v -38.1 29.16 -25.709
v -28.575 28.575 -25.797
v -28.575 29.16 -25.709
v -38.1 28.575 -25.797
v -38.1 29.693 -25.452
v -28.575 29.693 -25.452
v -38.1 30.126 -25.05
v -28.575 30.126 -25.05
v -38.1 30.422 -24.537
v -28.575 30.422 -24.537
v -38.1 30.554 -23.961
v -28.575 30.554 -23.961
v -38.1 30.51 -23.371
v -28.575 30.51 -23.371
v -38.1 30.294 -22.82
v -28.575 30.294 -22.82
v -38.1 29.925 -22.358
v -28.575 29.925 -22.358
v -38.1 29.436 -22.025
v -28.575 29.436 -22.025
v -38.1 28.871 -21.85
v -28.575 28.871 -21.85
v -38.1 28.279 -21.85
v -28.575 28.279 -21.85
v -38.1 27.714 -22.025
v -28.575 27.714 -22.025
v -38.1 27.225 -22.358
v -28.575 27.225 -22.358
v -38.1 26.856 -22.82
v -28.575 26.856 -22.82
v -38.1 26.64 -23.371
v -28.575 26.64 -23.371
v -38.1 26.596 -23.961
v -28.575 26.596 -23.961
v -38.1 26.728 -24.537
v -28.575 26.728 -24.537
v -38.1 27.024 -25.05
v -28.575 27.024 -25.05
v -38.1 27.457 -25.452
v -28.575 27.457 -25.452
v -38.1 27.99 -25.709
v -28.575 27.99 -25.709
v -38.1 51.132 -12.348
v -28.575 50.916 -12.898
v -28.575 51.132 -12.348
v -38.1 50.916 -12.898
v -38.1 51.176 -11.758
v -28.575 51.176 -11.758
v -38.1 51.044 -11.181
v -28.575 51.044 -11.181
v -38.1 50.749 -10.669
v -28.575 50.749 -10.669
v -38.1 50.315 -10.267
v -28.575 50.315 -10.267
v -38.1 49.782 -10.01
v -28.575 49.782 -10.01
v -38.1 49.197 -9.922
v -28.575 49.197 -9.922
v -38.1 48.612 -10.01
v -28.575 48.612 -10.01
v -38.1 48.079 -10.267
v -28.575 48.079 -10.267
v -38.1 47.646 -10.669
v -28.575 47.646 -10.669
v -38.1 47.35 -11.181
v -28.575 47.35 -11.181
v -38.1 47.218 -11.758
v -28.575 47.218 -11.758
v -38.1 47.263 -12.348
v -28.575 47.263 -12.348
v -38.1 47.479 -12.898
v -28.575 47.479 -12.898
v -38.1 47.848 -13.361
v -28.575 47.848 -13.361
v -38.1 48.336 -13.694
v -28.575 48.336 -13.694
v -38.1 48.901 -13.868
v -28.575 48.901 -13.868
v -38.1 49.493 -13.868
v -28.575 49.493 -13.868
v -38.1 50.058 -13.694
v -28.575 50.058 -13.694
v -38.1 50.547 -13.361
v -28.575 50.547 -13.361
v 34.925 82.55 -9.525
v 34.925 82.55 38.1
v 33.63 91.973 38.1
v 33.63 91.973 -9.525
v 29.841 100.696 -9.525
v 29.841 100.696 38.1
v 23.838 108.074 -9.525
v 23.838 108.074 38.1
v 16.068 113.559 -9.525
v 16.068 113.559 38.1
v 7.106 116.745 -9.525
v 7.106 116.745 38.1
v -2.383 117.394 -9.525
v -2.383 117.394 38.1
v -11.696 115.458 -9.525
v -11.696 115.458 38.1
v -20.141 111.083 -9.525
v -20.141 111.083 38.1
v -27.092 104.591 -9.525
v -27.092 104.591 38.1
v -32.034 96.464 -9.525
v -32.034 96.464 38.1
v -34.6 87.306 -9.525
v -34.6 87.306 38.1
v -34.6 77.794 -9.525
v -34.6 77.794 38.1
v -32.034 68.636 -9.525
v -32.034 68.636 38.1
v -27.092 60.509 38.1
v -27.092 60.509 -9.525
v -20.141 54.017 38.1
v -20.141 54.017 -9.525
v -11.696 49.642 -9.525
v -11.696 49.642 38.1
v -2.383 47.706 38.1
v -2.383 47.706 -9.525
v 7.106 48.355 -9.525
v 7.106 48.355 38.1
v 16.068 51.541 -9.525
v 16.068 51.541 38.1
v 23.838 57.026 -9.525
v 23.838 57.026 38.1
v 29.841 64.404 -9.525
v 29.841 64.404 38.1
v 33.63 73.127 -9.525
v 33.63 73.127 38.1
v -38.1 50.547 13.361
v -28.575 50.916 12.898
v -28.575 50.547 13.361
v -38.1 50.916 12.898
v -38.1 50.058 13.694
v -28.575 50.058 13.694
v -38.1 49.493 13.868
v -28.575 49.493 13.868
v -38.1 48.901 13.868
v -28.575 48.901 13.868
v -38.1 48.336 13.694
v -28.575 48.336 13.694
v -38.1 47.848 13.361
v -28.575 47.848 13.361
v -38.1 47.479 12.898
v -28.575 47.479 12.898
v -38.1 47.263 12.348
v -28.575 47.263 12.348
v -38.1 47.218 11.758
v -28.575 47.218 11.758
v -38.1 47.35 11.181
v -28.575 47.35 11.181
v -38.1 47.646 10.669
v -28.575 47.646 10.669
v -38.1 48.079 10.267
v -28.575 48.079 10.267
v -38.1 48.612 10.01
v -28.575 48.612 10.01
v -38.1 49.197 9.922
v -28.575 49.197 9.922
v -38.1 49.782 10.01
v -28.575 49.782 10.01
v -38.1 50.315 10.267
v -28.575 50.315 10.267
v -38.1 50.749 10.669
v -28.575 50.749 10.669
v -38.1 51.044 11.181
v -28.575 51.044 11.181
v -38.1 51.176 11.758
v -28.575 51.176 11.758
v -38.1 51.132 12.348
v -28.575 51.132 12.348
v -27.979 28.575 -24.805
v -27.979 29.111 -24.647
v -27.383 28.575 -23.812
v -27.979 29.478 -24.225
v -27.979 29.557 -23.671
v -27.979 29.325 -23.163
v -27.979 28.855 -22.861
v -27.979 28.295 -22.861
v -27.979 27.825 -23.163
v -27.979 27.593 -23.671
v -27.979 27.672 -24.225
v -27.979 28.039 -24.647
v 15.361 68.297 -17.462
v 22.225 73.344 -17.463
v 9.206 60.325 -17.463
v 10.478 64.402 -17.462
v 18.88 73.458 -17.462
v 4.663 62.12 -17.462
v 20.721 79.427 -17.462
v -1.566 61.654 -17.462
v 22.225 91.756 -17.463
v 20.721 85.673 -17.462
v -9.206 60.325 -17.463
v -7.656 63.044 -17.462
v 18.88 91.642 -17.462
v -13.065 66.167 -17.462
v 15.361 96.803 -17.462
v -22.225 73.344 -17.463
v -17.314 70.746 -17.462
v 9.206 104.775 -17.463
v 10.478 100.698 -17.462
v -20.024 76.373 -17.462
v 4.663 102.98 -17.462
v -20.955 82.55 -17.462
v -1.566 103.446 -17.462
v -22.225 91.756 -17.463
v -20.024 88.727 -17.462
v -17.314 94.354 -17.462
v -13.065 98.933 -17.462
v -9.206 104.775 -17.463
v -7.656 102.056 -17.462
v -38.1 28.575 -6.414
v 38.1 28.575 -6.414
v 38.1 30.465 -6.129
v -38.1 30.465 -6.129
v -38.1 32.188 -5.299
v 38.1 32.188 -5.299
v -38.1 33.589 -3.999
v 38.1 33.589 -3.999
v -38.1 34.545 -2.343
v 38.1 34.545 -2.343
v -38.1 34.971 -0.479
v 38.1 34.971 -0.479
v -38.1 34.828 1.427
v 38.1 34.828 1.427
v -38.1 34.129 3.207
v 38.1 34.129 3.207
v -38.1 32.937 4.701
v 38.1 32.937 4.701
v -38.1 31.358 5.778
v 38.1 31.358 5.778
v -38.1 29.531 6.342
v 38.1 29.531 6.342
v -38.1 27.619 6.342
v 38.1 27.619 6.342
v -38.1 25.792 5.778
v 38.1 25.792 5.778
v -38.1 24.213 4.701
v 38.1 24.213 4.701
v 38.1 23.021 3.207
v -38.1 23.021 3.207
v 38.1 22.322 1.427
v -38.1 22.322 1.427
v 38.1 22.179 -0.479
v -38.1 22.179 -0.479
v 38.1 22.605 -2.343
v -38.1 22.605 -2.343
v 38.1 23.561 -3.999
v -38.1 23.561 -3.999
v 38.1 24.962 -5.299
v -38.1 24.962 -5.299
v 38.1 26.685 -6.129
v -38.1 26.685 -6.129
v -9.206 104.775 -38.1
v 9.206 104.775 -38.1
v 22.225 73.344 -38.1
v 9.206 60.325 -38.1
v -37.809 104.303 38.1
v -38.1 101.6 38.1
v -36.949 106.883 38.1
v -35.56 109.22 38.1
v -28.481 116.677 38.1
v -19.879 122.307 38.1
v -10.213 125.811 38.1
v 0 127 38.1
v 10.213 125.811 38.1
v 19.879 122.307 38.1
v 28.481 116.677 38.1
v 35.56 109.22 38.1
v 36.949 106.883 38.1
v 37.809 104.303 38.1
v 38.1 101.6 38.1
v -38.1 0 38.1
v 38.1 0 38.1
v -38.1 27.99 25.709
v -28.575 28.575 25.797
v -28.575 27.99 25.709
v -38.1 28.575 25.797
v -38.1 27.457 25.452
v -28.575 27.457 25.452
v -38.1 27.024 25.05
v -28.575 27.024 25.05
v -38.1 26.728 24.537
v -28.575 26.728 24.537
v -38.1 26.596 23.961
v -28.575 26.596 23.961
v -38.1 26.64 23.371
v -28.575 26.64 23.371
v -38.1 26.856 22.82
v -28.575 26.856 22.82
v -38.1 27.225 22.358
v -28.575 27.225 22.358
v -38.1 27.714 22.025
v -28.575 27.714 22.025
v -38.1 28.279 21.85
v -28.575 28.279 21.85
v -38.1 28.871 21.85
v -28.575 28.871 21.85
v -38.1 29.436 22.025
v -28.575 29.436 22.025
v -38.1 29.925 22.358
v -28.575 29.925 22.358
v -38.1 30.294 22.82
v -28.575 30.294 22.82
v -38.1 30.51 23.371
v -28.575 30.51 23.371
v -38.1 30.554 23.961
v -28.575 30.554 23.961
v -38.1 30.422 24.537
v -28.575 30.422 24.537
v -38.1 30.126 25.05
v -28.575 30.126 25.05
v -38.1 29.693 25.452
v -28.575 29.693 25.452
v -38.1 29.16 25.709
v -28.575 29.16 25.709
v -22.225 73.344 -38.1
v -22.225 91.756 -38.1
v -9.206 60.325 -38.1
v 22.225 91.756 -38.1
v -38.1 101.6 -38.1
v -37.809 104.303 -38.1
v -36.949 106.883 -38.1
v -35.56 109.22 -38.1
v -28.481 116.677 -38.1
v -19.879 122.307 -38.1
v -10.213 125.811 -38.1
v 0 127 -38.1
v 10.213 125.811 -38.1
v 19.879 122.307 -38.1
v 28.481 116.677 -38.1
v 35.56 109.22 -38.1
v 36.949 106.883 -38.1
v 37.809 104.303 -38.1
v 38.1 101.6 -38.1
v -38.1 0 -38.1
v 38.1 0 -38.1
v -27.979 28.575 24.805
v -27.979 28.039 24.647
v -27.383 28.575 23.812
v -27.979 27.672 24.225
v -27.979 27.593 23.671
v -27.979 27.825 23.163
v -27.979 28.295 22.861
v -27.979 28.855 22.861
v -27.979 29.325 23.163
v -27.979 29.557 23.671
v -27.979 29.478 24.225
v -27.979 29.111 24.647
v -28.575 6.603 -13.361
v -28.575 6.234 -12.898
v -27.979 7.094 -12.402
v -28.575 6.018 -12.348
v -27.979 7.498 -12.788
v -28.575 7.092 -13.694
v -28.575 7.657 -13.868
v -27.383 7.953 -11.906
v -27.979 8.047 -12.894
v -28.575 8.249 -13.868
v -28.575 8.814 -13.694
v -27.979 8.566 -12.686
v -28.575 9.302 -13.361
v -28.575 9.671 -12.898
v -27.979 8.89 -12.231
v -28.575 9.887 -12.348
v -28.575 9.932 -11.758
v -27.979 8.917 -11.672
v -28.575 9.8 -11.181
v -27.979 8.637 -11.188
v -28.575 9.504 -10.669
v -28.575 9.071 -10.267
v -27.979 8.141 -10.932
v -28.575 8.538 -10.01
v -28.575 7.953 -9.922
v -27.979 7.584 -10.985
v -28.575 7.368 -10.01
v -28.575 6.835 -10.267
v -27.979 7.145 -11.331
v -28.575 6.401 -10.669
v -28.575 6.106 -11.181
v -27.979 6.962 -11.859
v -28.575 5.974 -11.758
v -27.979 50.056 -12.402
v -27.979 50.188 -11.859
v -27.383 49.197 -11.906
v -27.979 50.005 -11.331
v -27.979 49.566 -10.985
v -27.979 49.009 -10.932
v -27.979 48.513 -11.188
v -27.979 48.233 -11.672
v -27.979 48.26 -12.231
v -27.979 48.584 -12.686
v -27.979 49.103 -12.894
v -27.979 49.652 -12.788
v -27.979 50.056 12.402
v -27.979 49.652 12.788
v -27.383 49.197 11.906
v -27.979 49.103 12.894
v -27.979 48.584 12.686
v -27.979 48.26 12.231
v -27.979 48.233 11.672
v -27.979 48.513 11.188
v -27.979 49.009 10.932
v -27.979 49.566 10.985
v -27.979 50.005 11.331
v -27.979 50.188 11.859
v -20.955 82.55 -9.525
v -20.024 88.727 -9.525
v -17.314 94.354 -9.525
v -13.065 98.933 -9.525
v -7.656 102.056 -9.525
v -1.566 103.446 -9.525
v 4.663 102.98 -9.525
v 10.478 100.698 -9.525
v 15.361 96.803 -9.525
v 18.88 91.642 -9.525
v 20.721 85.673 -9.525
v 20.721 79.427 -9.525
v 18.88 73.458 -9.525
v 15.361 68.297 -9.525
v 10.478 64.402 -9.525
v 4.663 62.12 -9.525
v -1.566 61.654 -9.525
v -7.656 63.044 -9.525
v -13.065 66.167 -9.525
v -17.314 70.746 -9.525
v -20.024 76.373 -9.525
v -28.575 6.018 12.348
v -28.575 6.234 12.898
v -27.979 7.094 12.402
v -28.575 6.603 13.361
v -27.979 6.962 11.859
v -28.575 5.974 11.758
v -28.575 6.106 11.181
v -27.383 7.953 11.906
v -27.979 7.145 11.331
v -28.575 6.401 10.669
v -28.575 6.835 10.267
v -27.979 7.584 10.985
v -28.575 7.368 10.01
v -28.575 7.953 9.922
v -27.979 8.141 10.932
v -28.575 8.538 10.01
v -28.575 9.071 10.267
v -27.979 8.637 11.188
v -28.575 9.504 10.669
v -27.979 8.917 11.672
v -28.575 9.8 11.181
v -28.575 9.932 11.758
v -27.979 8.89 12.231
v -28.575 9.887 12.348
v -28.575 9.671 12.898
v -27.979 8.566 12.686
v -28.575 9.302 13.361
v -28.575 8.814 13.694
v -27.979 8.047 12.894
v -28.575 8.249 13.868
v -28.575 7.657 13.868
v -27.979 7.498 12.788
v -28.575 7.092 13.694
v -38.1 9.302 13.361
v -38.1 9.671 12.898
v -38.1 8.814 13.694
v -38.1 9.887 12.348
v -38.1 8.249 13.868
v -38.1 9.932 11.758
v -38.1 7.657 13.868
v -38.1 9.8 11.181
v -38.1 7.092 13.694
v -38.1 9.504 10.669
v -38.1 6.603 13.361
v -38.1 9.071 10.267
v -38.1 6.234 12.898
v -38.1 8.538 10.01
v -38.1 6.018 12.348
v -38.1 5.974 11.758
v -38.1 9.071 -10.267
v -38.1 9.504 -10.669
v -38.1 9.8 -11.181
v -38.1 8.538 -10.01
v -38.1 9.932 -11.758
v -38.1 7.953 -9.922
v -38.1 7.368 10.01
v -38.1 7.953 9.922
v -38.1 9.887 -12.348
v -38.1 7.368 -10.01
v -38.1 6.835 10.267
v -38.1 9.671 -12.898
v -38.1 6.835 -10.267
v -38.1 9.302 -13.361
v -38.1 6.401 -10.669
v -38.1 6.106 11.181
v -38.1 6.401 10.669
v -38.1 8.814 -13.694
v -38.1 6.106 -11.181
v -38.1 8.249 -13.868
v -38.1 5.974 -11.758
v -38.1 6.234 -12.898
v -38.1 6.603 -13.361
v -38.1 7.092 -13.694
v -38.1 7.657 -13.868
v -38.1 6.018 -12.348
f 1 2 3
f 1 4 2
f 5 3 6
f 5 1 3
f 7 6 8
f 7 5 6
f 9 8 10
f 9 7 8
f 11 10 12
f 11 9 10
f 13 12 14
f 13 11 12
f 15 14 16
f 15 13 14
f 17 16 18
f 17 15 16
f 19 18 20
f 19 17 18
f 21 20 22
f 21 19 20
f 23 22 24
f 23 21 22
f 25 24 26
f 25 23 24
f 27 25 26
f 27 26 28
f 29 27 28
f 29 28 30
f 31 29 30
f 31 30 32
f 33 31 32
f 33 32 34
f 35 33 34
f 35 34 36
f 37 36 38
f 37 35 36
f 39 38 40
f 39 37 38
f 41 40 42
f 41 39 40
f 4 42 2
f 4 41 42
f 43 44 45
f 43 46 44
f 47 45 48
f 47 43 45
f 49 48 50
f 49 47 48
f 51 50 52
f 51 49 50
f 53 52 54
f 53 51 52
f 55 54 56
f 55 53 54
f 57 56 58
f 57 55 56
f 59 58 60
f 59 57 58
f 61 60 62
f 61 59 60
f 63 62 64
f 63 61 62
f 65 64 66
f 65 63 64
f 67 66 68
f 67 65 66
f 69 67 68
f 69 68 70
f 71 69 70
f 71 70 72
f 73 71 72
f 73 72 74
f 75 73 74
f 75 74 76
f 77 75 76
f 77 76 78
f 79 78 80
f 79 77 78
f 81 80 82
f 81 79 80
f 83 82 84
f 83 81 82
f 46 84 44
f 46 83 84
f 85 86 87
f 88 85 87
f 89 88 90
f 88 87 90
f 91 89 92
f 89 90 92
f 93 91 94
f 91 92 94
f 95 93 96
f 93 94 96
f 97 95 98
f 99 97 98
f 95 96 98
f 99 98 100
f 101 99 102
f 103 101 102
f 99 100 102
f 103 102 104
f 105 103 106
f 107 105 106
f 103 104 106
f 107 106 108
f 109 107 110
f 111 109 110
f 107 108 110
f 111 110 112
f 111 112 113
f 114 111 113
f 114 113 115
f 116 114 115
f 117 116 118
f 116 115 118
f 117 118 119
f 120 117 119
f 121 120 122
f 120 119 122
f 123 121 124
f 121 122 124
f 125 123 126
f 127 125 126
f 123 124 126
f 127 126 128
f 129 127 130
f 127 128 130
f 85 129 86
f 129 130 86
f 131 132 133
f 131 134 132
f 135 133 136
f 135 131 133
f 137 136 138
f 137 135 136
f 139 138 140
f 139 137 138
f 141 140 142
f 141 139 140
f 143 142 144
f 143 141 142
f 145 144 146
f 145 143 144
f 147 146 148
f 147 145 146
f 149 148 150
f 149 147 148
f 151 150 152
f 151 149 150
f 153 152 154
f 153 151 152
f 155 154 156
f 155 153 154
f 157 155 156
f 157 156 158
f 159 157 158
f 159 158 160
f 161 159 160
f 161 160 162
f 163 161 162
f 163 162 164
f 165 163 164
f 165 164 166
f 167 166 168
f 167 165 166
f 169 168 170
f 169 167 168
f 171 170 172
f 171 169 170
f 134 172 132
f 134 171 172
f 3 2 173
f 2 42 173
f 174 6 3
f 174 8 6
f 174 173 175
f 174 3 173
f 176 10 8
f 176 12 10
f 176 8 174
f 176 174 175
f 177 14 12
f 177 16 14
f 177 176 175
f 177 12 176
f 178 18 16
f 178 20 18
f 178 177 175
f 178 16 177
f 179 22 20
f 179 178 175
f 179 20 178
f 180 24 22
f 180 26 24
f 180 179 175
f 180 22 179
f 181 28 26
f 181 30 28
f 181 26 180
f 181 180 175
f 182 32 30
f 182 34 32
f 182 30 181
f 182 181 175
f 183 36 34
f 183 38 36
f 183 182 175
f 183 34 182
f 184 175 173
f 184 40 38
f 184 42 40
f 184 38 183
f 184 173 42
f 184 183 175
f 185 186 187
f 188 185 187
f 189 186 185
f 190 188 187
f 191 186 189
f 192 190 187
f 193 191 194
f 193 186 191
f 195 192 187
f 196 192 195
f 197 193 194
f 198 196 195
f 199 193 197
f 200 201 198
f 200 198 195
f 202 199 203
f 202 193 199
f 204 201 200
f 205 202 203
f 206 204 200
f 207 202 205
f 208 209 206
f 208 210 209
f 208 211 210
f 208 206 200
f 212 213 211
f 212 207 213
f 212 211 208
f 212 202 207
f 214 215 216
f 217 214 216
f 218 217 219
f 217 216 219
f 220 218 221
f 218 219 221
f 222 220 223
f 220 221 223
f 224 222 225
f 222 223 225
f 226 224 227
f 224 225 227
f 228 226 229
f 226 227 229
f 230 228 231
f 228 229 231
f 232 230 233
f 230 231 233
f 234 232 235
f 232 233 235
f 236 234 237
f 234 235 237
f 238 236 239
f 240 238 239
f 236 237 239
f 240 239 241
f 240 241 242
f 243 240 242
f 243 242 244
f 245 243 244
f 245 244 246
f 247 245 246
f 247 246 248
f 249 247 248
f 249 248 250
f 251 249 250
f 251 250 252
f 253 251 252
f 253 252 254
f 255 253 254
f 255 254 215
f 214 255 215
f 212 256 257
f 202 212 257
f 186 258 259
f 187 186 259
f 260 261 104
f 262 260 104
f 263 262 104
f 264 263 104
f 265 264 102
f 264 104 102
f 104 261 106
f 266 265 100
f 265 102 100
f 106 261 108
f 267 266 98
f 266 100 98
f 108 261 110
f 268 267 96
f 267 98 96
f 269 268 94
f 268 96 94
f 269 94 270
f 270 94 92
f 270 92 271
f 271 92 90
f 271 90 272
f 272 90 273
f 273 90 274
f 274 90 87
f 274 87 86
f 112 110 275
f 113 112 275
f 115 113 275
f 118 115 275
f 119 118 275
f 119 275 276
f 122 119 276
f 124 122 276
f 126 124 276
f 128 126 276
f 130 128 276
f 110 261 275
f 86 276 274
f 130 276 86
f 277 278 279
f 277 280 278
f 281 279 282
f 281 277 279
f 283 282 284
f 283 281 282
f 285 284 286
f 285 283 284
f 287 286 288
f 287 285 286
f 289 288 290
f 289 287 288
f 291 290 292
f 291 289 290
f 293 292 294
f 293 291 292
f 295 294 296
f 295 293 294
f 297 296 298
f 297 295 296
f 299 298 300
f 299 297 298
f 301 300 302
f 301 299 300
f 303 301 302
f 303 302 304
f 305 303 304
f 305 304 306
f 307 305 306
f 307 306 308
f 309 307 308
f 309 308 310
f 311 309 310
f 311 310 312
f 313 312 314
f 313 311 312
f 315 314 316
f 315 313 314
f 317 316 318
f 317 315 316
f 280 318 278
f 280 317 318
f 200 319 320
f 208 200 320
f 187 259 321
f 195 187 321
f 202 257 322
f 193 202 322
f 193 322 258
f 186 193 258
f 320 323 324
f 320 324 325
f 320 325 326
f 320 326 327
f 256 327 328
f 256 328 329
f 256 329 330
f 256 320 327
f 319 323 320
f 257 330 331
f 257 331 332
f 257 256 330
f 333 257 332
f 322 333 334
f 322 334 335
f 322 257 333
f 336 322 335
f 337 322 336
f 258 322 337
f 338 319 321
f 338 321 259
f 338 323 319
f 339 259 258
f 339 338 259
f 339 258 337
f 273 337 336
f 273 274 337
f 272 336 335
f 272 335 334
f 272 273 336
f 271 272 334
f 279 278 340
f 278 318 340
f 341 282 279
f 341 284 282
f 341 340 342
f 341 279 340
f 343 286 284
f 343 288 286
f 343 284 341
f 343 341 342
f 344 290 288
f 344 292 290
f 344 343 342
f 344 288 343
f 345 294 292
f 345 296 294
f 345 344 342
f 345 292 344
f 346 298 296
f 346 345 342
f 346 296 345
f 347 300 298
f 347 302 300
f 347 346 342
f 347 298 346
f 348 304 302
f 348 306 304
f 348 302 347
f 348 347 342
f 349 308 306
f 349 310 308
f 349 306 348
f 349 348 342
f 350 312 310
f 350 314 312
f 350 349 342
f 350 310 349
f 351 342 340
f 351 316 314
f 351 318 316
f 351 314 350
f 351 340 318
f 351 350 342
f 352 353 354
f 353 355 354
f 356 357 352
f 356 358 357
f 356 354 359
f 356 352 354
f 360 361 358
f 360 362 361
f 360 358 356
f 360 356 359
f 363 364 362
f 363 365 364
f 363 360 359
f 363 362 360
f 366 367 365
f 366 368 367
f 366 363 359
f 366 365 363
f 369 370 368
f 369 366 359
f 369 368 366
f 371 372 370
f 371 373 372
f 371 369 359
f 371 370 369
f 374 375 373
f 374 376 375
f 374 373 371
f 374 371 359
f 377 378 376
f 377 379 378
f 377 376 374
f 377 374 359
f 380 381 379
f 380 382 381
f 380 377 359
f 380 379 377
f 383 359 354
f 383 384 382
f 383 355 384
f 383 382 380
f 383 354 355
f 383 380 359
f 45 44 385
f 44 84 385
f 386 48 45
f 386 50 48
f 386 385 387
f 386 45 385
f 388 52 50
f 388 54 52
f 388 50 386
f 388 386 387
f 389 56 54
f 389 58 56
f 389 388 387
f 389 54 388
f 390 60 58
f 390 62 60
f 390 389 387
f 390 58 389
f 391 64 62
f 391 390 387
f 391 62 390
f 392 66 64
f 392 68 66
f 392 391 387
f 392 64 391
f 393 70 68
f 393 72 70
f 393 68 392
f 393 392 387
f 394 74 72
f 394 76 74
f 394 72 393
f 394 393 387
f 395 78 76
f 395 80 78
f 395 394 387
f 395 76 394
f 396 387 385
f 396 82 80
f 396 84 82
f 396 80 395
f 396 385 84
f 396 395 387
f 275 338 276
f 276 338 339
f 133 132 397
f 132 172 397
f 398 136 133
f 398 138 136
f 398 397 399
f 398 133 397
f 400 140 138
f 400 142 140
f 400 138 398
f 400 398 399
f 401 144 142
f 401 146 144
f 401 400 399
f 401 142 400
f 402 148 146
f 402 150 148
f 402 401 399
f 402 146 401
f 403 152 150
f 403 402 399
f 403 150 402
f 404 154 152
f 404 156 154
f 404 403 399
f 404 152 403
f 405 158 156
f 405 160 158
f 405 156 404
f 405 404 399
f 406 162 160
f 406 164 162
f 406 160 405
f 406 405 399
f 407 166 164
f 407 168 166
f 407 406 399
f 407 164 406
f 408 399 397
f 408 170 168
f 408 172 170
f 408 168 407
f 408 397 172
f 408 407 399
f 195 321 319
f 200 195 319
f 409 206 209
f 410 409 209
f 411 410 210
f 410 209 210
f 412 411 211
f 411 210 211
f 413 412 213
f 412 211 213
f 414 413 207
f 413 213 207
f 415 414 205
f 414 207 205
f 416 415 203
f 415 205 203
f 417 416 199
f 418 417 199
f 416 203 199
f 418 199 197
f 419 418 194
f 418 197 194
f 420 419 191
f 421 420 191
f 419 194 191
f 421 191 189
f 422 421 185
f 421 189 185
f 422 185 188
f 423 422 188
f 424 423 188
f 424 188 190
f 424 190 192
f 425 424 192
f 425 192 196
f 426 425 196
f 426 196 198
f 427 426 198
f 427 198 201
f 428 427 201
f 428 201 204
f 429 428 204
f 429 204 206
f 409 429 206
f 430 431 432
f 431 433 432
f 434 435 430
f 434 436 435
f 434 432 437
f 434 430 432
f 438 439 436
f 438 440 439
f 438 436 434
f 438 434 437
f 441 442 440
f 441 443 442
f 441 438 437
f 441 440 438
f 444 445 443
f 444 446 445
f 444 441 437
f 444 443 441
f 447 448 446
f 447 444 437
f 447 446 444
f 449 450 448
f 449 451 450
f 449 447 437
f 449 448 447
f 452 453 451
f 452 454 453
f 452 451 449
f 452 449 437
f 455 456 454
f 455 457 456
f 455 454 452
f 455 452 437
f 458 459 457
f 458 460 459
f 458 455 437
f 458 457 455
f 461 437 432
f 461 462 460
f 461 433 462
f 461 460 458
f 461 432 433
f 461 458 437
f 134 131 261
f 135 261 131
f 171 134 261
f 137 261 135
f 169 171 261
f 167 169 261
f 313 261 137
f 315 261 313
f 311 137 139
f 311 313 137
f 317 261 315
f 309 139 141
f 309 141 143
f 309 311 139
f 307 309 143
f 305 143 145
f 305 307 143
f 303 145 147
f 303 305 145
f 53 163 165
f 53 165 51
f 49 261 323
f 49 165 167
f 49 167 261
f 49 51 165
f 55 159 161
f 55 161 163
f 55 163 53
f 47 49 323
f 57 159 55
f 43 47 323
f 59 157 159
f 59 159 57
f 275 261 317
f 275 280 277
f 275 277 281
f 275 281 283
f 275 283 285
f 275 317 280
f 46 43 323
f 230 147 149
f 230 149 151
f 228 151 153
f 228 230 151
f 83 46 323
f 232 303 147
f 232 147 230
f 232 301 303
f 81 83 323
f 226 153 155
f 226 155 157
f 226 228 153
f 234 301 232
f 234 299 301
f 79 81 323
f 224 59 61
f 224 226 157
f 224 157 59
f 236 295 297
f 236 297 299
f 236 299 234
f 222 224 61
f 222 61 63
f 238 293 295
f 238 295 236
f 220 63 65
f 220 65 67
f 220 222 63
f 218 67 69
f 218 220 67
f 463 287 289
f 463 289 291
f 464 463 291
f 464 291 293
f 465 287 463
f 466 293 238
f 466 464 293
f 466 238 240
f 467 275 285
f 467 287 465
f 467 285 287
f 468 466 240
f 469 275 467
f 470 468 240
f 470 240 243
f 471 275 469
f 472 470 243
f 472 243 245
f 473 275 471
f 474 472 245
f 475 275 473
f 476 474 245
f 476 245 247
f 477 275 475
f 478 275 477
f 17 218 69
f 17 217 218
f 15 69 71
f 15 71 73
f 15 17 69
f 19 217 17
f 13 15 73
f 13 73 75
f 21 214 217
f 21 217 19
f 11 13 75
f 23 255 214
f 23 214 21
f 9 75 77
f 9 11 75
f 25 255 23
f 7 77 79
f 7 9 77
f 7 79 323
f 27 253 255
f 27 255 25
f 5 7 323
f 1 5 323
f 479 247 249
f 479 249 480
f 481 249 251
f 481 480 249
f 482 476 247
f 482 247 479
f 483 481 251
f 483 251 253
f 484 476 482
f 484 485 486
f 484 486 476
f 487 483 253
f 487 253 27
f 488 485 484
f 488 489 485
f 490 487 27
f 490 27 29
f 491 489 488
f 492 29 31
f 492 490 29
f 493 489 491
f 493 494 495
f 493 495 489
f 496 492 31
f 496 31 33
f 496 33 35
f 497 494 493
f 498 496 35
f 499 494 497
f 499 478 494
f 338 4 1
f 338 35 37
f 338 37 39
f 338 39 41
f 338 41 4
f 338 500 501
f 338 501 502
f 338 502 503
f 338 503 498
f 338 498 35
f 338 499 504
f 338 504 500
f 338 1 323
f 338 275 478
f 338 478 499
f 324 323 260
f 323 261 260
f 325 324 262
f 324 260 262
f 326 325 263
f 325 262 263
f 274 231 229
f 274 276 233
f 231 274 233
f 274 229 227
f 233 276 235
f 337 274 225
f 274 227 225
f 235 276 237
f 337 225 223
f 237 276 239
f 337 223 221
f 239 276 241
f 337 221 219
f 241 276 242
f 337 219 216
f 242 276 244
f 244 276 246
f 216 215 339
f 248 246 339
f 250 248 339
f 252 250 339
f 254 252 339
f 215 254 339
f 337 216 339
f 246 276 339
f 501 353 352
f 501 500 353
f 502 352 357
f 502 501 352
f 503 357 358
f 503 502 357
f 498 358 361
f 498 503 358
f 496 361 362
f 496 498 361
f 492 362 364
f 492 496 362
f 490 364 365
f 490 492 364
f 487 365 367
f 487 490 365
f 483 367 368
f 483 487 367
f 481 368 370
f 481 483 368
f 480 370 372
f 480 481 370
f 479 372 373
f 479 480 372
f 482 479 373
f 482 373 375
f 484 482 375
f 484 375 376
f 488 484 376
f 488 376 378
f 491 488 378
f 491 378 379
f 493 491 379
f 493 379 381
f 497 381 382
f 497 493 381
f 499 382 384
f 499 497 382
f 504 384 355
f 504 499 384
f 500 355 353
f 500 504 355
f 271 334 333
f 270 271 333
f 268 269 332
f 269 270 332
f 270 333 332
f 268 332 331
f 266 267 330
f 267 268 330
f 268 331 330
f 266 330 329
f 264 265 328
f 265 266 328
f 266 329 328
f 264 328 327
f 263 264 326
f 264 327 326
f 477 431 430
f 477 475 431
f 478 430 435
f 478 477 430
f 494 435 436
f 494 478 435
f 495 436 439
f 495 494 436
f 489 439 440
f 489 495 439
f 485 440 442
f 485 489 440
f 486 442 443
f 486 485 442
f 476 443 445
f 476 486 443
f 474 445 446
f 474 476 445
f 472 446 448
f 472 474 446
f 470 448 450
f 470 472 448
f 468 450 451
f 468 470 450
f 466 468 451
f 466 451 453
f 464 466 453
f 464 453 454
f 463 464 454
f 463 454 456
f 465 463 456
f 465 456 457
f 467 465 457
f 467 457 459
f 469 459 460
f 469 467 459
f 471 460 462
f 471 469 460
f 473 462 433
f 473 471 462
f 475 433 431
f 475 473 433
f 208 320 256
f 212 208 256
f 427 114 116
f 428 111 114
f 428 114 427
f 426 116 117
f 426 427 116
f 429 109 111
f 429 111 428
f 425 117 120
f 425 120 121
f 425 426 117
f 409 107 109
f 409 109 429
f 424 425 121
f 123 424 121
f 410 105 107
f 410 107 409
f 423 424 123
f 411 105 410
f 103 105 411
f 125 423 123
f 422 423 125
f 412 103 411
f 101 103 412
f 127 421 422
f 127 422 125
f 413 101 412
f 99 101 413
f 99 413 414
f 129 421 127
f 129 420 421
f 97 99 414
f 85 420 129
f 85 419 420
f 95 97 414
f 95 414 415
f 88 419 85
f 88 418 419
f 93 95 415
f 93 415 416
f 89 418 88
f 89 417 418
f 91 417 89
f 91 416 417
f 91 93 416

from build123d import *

# Parameters (mm, degrees)
SKETCH1_W           = 76.2
SKETCH1_H           = 76.2
BOSS_EXTRUDE1_DEPTH = 127
SKETCH3_R           = 34.925
CUT_EXTRUDE1_DEPTH  = 47.625
CUT_EXTRUDE3_DEPTH  = 20.6375
CUT_EXTRUDE4_REACH  = 145.763
SKETCH6_R           = 20.955
CUT_EXTRUDE5_START  = -76.2
CUT_EXTRUDE5_DEPTH  = 76.2
FILLET1_R           = 12.7
SKETCH8_R           = 6.4135
CUT_EXTRUDE6_DEPTH  = 153.928251151
CIRPATTERN1_COUNT   = 6


with BuildPart() as part:
    # Sketch1 → Boss-Extrude1 (new body)
    with BuildSketch(Plane(origin=(0, 0, 0), x_dir=(1, 0, 0), z_dir=(0, 1, 0))):
        Rectangle(SKETCH1_W, SKETCH1_H)
    extrude(amount=BOSS_EXTRUDE1_DEPTH)

    # Sketch3 → Cut-Extrude1 (cut)
    with BuildSketch(Plane.XY.offset(38.1)):
        with Locations((0, 82.55)):
            Circle(SKETCH3_R)
    extrude(amount=-CUT_EXTRUDE1_DEPTH, mode=Mode.SUBTRACT)

    # Sketch5 → Cut-Extrude3 (cut)
    with BuildSketch(Plane(origin=(0, 0, -38.1), x_dir=(-1, 0, 0), z_dir=(0, 0, -1))):
        Polygon((22.225, 73.344103576), (22.225, 91.755896424), (9.205896424, 104.775), (-9.205896424, 104.775), (-22.225, 91.755896424), (-22.225, 73.344103576), (-9.205896424, 60.325), (9.205896424, 60.325), align=None)
    extrude(amount=-CUT_EXTRUDE3_DEPTH, mode=Mode.SUBTRACT)

    # Sketch6 → Cut-Extrude4 (cut, up to next)
    with BuildSketch(Plane(origin=(0, 0, -17.4625), x_dir=(-1, 0, 0), z_dir=(0, 0, -1)), mode=Mode.PRIVATE) as cut_extrude4_sk1:
        with Locations((0, 82.55)):
            Circle(SKETCH6_R)
    cut_extrude4_tool1 = extrude(cut_extrude4_sk1.sketch, amount=-CUT_EXTRUDE4_REACH, mode=Mode.PRIVATE) & part.part
    add(cut_extrude4_tool1.solids().sort_by_distance((0, 82.55, -17.4625))[0], mode=Mode.SUBTRACT)

    # Sketch7 → Cut-Extrude5 (cut)
    with BuildSketch(Plane.XY.offset(38.1).offset(CUT_EXTRUDE5_START)):
        with BuildLine():
            Line((-38.1, 105.445250599), (-38.1, 130.845250599))
            Line((-38.1, 130.845250599), (38.1, 130.845250599))
            Line((38.1, 130.845250599), (38.1, 105.445250599))
            ThreePointArc((38.1, 105.445250599), (0, 127), (-38.1, 105.445250599))
        make_face()
    extrude(amount=CUT_EXTRUDE5_DEPTH, mode=Mode.SUBTRACT)

    # Fillet1
    fillet1_edges = [part.edges().sort_by_distance(p)[0] for p in [
        (-38.1, 105.445250599, 0),
        (38.1, 105.445250599, 0),
    ]]
    fillet(fillet1_edges, radius=FILLET1_R)

    # Sketch8 → Cut-Extrude6 (cut, through all)
    with BuildSketch(Plane(origin=(38.1, 0, 0), x_dir=(0, 0, -1), z_dir=(1, 0, 0))):
        with Locations((0, 28.575)):
            Circle(SKETCH8_R)
    extrude(amount=-CUT_EXTRUDE6_DEPTH, mode=Mode.SUBTRACT)

    # Sketch12 → #10 (0.1935) Diameter Hole1 (revolve, cut)
    with BuildSketch(Plane(origin=(-38.1, 28.575, 23.8125), x_dir=(0, 0, 1), z_dir=(0, 1, 0))):
        Polygon((0, 0), (0, 10.717332791), (1.984375, 9.525), (1.984375, 0), align=None)
    f_10_0_1935_diameter_hole1 = revolve(axis=Axis((-44.45, 28.575, 23.8125), (1, 0, 0)), mode=Mode.SUBTRACT)

    # CirPattern1: #10 (0.1935) Diameter Hole1 ×6 about axis
    cirpattern1_axis = Axis((0, 28.575, 0), (1, 0, 0))
    for i in range(1, CIRPATTERN1_COUNT):
        add(f_10_0_1935_diameter_hole1.rotate(cirpattern1_axis, i * 360 / CIRPATTERN1_COUNT), mode=Mode.SUBTRACT)


solid = part.part
